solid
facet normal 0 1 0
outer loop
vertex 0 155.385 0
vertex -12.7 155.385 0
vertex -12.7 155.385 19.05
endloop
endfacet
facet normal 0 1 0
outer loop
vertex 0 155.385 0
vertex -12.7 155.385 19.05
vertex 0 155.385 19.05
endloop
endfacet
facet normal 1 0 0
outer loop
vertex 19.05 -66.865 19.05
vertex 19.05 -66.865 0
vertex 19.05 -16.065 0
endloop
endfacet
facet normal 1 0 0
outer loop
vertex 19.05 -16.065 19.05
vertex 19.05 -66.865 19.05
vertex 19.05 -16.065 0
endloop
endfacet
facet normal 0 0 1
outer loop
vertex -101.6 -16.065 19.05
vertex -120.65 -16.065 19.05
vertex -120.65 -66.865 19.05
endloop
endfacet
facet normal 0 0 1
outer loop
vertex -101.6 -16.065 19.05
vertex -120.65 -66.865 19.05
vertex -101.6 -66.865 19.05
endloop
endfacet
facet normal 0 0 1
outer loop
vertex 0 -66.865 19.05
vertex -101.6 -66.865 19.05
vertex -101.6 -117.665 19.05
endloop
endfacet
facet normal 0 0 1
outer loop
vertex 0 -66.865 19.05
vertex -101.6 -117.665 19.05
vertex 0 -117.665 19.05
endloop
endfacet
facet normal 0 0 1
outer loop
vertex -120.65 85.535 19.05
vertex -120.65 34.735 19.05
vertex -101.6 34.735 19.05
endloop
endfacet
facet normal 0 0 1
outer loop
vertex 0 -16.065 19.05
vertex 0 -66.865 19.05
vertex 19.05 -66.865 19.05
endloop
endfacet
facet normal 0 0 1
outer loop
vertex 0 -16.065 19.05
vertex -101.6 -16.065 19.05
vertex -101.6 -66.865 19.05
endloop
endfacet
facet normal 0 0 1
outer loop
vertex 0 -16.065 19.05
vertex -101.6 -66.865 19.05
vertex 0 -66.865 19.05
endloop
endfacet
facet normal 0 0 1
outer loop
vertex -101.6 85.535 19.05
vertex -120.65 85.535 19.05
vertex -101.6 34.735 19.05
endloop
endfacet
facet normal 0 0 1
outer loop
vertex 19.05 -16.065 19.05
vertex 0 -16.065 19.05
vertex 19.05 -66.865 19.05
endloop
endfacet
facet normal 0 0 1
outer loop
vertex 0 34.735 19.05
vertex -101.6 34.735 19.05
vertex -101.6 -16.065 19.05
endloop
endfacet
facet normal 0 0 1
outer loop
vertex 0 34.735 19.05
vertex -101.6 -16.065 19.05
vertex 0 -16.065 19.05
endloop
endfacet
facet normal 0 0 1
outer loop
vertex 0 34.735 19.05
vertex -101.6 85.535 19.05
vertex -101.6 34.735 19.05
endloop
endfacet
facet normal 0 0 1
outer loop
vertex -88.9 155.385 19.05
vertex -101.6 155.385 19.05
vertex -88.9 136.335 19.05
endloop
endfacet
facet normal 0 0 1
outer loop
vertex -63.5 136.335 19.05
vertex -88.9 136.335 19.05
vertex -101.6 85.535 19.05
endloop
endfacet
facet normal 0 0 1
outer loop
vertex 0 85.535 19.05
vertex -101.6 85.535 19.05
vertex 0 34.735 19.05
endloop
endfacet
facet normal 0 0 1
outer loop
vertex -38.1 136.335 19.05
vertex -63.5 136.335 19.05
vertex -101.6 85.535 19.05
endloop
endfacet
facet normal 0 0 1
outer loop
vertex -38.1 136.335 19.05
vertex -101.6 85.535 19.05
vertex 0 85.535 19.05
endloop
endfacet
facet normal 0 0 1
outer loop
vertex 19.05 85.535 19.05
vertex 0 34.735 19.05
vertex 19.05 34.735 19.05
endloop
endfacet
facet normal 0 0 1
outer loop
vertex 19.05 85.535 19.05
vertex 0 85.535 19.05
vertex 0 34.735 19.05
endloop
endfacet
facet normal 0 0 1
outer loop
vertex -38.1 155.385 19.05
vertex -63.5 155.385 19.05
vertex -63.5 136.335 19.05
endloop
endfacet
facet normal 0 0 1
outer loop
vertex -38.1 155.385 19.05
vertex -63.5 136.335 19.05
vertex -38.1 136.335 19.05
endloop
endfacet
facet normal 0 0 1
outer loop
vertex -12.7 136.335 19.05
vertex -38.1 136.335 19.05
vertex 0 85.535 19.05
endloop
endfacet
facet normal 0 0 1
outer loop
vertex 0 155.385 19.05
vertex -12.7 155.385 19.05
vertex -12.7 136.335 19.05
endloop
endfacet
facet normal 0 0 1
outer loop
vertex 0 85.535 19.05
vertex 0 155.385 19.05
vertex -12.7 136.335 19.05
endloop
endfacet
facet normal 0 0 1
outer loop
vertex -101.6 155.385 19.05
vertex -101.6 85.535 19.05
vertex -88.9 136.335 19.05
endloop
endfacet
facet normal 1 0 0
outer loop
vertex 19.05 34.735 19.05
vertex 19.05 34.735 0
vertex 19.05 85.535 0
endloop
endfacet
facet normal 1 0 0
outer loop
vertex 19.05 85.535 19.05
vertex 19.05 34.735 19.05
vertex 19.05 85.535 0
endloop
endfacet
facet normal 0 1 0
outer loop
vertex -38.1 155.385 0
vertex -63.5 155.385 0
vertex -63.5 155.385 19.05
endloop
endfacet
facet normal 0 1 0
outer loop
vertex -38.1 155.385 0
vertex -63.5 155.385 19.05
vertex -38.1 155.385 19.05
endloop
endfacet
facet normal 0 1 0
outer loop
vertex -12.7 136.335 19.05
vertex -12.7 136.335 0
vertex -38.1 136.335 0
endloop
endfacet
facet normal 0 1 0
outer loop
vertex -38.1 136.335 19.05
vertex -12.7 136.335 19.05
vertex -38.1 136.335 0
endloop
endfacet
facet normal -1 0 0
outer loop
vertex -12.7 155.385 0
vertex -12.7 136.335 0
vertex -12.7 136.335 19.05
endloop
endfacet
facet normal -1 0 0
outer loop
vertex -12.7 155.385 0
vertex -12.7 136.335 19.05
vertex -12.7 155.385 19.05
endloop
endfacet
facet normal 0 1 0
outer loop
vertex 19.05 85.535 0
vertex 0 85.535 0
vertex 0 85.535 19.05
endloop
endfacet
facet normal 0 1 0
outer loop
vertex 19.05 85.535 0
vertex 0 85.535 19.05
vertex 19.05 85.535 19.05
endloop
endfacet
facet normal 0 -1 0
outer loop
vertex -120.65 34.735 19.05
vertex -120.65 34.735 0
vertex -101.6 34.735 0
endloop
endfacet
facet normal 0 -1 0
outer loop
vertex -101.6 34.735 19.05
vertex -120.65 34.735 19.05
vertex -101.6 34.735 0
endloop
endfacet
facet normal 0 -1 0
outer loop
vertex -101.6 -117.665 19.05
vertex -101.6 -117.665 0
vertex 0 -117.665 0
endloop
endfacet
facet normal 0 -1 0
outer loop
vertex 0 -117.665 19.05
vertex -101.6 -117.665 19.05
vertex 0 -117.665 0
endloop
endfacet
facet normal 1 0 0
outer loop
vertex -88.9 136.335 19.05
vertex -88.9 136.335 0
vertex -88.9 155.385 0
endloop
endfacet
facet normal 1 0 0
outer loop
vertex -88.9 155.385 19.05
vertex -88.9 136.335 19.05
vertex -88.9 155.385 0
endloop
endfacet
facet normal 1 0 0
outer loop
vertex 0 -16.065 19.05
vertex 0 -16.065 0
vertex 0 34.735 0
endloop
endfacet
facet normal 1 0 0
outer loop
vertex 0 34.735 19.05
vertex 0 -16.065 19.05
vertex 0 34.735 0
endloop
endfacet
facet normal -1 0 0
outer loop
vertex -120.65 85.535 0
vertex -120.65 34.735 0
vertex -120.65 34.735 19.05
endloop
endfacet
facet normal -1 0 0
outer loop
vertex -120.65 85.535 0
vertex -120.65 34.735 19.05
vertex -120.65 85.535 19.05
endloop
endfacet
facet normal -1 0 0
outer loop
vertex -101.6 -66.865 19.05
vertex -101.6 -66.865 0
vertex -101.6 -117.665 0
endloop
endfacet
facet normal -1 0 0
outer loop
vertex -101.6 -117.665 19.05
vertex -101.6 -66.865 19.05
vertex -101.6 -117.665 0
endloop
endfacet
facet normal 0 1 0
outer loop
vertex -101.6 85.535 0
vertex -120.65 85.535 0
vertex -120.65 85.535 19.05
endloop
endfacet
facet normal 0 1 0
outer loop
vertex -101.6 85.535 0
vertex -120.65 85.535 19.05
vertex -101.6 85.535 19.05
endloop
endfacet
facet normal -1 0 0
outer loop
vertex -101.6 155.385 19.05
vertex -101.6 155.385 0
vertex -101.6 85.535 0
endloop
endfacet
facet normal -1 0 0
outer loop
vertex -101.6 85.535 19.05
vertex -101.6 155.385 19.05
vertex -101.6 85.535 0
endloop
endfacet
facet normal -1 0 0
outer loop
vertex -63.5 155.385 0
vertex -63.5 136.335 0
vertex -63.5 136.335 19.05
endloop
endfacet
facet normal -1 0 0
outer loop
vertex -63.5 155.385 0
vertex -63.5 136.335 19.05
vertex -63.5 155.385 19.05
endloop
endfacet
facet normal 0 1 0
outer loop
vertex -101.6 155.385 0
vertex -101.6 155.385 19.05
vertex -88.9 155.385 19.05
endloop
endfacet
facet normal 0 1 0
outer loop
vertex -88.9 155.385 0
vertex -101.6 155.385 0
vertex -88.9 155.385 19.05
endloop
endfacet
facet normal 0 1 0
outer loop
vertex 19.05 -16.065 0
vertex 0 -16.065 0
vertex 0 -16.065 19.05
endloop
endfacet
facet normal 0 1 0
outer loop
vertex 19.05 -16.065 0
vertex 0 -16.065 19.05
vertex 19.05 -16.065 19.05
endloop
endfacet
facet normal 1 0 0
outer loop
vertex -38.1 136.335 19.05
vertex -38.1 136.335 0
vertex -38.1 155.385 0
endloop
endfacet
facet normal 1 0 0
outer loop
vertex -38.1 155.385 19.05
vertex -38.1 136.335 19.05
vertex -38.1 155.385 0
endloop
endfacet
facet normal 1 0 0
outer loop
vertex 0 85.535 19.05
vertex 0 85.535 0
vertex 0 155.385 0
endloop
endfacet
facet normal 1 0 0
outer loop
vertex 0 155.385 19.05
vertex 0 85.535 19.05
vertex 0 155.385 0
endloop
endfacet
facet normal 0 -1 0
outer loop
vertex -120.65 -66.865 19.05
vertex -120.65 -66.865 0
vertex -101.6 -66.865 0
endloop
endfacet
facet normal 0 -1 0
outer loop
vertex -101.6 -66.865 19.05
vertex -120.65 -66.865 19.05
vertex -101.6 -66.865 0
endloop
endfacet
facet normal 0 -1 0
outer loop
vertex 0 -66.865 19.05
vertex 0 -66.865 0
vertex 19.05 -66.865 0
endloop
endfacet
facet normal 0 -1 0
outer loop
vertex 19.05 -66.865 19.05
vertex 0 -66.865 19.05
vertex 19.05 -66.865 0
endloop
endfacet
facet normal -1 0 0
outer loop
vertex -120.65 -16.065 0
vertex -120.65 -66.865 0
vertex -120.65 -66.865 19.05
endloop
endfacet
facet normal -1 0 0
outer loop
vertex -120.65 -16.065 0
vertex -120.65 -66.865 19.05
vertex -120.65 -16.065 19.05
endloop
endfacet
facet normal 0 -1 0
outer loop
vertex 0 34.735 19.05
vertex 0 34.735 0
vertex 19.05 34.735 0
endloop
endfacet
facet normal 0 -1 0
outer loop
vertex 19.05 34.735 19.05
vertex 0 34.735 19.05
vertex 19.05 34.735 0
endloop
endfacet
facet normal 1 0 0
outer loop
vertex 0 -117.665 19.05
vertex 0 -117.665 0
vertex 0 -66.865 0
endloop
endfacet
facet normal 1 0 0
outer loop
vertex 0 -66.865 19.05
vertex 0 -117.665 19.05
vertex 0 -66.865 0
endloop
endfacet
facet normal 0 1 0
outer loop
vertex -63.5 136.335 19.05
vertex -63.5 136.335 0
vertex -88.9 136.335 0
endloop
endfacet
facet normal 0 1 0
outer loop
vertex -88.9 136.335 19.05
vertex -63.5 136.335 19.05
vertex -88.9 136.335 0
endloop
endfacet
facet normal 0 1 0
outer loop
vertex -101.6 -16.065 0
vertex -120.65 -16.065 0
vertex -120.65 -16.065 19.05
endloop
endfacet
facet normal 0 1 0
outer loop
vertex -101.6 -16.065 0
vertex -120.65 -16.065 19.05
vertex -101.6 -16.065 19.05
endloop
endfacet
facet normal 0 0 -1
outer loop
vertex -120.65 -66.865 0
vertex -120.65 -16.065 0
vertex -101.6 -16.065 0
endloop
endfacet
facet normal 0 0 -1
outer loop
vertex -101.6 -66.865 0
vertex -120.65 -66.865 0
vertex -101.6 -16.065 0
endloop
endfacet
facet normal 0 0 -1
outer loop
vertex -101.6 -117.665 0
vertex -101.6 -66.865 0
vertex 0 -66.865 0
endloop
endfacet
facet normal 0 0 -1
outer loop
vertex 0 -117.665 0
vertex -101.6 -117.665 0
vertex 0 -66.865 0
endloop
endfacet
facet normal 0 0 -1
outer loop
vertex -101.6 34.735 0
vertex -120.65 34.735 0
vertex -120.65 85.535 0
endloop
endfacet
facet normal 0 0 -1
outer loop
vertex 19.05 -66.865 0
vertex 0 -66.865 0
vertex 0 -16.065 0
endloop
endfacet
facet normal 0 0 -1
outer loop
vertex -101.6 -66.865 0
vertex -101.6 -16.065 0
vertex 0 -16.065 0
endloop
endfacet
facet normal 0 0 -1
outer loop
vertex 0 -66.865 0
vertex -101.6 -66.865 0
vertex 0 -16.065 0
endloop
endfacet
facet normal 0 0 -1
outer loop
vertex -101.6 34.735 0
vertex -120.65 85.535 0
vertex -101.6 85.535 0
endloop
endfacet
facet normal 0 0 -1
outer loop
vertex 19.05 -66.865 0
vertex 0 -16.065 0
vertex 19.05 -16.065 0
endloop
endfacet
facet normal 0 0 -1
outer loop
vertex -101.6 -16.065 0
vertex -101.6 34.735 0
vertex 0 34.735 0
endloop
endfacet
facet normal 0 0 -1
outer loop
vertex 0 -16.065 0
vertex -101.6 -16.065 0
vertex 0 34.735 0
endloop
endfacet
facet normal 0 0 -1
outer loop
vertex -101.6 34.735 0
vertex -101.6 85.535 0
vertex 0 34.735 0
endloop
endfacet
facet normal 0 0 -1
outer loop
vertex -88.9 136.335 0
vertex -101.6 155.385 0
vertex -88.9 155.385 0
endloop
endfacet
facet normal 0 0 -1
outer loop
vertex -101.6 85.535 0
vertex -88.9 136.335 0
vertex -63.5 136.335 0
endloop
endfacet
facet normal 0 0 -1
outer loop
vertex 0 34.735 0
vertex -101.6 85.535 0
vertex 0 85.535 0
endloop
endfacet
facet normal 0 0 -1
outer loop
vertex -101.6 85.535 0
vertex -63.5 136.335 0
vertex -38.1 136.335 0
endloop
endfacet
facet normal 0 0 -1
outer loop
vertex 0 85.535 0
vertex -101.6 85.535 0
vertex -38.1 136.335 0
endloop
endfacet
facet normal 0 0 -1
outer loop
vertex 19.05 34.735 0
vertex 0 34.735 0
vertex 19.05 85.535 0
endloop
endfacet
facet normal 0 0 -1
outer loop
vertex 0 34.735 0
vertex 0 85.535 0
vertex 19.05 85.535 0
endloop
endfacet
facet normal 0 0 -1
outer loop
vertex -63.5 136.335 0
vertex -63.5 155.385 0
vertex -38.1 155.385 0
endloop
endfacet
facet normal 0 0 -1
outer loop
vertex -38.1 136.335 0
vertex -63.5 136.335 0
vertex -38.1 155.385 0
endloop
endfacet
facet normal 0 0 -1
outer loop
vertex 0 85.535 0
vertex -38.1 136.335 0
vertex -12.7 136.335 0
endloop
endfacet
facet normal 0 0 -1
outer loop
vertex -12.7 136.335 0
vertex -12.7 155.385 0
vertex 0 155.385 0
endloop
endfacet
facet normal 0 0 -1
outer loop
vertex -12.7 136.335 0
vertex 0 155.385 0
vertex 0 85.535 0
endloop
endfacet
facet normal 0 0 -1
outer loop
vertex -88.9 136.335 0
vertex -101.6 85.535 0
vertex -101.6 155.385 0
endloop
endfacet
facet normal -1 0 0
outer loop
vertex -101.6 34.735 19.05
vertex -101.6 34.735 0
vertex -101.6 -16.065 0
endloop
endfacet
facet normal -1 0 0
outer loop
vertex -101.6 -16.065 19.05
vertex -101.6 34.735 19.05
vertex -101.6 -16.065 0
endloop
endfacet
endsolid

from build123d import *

# Parameters (mm, degrees)
F0_W     = 19.05
F0_H     = 50.8
F0_W_2   = 25.4
F0_H_2   = 19.05
F0_W_3   = 12.7
F1_DEPTH = 19.05


with BuildPart() as f1:
    # F0 (on Top) → F1 (new body)
    with BuildSketch(Plane.XY):
        with Locations((-111.125, 60.1353453214)):
            Rectangle(F0_W, F0_H)
        with Locations((-111.125, -41.4646546786)):
            Rectangle(F0_W, F0_H)
        Polygon((-88.9, 136.3353453214), (-101.6, 136.3353453214), (-101.6, 85.5353453214), (-101.6, 34.7353453214), (-101.6, -16.0646546786), (-101.6, -66.8646546786), (-101.6, -117.6646546786), (0, -117.6646546786), (0, -101.2241342793), (0, -66.8646546786), (0, -16.0646546786), (0, 34.7353453214), (0, 85.5353453214), (0, 136.3353453214), (-12.7, 136.3353453214), (-25.4, 136.3353453214), (-38.1, 136.3353453214), (-63.5, 136.3353453214), align=None)
        with Locations((9.525, -41.4646546786)):
            Rectangle(F0_W, F0_H)
        with Locations((9.525, 60.1353453214)):
            Rectangle(F0_W, F0_H)
        with Locations((-50.8, 145.8603453214)):
            Rectangle(F0_W_2, F0_H_2)
        with Locations((-95.25, 145.8603453214)):
            Rectangle(F0_W_3, F0_H_2)
        with Locations((-6.35, 145.8603453214)):
            Rectangle(F0_W_3, F0_H_2)
    extrude(amount=F1_DEPTH)


solid = f1.part
